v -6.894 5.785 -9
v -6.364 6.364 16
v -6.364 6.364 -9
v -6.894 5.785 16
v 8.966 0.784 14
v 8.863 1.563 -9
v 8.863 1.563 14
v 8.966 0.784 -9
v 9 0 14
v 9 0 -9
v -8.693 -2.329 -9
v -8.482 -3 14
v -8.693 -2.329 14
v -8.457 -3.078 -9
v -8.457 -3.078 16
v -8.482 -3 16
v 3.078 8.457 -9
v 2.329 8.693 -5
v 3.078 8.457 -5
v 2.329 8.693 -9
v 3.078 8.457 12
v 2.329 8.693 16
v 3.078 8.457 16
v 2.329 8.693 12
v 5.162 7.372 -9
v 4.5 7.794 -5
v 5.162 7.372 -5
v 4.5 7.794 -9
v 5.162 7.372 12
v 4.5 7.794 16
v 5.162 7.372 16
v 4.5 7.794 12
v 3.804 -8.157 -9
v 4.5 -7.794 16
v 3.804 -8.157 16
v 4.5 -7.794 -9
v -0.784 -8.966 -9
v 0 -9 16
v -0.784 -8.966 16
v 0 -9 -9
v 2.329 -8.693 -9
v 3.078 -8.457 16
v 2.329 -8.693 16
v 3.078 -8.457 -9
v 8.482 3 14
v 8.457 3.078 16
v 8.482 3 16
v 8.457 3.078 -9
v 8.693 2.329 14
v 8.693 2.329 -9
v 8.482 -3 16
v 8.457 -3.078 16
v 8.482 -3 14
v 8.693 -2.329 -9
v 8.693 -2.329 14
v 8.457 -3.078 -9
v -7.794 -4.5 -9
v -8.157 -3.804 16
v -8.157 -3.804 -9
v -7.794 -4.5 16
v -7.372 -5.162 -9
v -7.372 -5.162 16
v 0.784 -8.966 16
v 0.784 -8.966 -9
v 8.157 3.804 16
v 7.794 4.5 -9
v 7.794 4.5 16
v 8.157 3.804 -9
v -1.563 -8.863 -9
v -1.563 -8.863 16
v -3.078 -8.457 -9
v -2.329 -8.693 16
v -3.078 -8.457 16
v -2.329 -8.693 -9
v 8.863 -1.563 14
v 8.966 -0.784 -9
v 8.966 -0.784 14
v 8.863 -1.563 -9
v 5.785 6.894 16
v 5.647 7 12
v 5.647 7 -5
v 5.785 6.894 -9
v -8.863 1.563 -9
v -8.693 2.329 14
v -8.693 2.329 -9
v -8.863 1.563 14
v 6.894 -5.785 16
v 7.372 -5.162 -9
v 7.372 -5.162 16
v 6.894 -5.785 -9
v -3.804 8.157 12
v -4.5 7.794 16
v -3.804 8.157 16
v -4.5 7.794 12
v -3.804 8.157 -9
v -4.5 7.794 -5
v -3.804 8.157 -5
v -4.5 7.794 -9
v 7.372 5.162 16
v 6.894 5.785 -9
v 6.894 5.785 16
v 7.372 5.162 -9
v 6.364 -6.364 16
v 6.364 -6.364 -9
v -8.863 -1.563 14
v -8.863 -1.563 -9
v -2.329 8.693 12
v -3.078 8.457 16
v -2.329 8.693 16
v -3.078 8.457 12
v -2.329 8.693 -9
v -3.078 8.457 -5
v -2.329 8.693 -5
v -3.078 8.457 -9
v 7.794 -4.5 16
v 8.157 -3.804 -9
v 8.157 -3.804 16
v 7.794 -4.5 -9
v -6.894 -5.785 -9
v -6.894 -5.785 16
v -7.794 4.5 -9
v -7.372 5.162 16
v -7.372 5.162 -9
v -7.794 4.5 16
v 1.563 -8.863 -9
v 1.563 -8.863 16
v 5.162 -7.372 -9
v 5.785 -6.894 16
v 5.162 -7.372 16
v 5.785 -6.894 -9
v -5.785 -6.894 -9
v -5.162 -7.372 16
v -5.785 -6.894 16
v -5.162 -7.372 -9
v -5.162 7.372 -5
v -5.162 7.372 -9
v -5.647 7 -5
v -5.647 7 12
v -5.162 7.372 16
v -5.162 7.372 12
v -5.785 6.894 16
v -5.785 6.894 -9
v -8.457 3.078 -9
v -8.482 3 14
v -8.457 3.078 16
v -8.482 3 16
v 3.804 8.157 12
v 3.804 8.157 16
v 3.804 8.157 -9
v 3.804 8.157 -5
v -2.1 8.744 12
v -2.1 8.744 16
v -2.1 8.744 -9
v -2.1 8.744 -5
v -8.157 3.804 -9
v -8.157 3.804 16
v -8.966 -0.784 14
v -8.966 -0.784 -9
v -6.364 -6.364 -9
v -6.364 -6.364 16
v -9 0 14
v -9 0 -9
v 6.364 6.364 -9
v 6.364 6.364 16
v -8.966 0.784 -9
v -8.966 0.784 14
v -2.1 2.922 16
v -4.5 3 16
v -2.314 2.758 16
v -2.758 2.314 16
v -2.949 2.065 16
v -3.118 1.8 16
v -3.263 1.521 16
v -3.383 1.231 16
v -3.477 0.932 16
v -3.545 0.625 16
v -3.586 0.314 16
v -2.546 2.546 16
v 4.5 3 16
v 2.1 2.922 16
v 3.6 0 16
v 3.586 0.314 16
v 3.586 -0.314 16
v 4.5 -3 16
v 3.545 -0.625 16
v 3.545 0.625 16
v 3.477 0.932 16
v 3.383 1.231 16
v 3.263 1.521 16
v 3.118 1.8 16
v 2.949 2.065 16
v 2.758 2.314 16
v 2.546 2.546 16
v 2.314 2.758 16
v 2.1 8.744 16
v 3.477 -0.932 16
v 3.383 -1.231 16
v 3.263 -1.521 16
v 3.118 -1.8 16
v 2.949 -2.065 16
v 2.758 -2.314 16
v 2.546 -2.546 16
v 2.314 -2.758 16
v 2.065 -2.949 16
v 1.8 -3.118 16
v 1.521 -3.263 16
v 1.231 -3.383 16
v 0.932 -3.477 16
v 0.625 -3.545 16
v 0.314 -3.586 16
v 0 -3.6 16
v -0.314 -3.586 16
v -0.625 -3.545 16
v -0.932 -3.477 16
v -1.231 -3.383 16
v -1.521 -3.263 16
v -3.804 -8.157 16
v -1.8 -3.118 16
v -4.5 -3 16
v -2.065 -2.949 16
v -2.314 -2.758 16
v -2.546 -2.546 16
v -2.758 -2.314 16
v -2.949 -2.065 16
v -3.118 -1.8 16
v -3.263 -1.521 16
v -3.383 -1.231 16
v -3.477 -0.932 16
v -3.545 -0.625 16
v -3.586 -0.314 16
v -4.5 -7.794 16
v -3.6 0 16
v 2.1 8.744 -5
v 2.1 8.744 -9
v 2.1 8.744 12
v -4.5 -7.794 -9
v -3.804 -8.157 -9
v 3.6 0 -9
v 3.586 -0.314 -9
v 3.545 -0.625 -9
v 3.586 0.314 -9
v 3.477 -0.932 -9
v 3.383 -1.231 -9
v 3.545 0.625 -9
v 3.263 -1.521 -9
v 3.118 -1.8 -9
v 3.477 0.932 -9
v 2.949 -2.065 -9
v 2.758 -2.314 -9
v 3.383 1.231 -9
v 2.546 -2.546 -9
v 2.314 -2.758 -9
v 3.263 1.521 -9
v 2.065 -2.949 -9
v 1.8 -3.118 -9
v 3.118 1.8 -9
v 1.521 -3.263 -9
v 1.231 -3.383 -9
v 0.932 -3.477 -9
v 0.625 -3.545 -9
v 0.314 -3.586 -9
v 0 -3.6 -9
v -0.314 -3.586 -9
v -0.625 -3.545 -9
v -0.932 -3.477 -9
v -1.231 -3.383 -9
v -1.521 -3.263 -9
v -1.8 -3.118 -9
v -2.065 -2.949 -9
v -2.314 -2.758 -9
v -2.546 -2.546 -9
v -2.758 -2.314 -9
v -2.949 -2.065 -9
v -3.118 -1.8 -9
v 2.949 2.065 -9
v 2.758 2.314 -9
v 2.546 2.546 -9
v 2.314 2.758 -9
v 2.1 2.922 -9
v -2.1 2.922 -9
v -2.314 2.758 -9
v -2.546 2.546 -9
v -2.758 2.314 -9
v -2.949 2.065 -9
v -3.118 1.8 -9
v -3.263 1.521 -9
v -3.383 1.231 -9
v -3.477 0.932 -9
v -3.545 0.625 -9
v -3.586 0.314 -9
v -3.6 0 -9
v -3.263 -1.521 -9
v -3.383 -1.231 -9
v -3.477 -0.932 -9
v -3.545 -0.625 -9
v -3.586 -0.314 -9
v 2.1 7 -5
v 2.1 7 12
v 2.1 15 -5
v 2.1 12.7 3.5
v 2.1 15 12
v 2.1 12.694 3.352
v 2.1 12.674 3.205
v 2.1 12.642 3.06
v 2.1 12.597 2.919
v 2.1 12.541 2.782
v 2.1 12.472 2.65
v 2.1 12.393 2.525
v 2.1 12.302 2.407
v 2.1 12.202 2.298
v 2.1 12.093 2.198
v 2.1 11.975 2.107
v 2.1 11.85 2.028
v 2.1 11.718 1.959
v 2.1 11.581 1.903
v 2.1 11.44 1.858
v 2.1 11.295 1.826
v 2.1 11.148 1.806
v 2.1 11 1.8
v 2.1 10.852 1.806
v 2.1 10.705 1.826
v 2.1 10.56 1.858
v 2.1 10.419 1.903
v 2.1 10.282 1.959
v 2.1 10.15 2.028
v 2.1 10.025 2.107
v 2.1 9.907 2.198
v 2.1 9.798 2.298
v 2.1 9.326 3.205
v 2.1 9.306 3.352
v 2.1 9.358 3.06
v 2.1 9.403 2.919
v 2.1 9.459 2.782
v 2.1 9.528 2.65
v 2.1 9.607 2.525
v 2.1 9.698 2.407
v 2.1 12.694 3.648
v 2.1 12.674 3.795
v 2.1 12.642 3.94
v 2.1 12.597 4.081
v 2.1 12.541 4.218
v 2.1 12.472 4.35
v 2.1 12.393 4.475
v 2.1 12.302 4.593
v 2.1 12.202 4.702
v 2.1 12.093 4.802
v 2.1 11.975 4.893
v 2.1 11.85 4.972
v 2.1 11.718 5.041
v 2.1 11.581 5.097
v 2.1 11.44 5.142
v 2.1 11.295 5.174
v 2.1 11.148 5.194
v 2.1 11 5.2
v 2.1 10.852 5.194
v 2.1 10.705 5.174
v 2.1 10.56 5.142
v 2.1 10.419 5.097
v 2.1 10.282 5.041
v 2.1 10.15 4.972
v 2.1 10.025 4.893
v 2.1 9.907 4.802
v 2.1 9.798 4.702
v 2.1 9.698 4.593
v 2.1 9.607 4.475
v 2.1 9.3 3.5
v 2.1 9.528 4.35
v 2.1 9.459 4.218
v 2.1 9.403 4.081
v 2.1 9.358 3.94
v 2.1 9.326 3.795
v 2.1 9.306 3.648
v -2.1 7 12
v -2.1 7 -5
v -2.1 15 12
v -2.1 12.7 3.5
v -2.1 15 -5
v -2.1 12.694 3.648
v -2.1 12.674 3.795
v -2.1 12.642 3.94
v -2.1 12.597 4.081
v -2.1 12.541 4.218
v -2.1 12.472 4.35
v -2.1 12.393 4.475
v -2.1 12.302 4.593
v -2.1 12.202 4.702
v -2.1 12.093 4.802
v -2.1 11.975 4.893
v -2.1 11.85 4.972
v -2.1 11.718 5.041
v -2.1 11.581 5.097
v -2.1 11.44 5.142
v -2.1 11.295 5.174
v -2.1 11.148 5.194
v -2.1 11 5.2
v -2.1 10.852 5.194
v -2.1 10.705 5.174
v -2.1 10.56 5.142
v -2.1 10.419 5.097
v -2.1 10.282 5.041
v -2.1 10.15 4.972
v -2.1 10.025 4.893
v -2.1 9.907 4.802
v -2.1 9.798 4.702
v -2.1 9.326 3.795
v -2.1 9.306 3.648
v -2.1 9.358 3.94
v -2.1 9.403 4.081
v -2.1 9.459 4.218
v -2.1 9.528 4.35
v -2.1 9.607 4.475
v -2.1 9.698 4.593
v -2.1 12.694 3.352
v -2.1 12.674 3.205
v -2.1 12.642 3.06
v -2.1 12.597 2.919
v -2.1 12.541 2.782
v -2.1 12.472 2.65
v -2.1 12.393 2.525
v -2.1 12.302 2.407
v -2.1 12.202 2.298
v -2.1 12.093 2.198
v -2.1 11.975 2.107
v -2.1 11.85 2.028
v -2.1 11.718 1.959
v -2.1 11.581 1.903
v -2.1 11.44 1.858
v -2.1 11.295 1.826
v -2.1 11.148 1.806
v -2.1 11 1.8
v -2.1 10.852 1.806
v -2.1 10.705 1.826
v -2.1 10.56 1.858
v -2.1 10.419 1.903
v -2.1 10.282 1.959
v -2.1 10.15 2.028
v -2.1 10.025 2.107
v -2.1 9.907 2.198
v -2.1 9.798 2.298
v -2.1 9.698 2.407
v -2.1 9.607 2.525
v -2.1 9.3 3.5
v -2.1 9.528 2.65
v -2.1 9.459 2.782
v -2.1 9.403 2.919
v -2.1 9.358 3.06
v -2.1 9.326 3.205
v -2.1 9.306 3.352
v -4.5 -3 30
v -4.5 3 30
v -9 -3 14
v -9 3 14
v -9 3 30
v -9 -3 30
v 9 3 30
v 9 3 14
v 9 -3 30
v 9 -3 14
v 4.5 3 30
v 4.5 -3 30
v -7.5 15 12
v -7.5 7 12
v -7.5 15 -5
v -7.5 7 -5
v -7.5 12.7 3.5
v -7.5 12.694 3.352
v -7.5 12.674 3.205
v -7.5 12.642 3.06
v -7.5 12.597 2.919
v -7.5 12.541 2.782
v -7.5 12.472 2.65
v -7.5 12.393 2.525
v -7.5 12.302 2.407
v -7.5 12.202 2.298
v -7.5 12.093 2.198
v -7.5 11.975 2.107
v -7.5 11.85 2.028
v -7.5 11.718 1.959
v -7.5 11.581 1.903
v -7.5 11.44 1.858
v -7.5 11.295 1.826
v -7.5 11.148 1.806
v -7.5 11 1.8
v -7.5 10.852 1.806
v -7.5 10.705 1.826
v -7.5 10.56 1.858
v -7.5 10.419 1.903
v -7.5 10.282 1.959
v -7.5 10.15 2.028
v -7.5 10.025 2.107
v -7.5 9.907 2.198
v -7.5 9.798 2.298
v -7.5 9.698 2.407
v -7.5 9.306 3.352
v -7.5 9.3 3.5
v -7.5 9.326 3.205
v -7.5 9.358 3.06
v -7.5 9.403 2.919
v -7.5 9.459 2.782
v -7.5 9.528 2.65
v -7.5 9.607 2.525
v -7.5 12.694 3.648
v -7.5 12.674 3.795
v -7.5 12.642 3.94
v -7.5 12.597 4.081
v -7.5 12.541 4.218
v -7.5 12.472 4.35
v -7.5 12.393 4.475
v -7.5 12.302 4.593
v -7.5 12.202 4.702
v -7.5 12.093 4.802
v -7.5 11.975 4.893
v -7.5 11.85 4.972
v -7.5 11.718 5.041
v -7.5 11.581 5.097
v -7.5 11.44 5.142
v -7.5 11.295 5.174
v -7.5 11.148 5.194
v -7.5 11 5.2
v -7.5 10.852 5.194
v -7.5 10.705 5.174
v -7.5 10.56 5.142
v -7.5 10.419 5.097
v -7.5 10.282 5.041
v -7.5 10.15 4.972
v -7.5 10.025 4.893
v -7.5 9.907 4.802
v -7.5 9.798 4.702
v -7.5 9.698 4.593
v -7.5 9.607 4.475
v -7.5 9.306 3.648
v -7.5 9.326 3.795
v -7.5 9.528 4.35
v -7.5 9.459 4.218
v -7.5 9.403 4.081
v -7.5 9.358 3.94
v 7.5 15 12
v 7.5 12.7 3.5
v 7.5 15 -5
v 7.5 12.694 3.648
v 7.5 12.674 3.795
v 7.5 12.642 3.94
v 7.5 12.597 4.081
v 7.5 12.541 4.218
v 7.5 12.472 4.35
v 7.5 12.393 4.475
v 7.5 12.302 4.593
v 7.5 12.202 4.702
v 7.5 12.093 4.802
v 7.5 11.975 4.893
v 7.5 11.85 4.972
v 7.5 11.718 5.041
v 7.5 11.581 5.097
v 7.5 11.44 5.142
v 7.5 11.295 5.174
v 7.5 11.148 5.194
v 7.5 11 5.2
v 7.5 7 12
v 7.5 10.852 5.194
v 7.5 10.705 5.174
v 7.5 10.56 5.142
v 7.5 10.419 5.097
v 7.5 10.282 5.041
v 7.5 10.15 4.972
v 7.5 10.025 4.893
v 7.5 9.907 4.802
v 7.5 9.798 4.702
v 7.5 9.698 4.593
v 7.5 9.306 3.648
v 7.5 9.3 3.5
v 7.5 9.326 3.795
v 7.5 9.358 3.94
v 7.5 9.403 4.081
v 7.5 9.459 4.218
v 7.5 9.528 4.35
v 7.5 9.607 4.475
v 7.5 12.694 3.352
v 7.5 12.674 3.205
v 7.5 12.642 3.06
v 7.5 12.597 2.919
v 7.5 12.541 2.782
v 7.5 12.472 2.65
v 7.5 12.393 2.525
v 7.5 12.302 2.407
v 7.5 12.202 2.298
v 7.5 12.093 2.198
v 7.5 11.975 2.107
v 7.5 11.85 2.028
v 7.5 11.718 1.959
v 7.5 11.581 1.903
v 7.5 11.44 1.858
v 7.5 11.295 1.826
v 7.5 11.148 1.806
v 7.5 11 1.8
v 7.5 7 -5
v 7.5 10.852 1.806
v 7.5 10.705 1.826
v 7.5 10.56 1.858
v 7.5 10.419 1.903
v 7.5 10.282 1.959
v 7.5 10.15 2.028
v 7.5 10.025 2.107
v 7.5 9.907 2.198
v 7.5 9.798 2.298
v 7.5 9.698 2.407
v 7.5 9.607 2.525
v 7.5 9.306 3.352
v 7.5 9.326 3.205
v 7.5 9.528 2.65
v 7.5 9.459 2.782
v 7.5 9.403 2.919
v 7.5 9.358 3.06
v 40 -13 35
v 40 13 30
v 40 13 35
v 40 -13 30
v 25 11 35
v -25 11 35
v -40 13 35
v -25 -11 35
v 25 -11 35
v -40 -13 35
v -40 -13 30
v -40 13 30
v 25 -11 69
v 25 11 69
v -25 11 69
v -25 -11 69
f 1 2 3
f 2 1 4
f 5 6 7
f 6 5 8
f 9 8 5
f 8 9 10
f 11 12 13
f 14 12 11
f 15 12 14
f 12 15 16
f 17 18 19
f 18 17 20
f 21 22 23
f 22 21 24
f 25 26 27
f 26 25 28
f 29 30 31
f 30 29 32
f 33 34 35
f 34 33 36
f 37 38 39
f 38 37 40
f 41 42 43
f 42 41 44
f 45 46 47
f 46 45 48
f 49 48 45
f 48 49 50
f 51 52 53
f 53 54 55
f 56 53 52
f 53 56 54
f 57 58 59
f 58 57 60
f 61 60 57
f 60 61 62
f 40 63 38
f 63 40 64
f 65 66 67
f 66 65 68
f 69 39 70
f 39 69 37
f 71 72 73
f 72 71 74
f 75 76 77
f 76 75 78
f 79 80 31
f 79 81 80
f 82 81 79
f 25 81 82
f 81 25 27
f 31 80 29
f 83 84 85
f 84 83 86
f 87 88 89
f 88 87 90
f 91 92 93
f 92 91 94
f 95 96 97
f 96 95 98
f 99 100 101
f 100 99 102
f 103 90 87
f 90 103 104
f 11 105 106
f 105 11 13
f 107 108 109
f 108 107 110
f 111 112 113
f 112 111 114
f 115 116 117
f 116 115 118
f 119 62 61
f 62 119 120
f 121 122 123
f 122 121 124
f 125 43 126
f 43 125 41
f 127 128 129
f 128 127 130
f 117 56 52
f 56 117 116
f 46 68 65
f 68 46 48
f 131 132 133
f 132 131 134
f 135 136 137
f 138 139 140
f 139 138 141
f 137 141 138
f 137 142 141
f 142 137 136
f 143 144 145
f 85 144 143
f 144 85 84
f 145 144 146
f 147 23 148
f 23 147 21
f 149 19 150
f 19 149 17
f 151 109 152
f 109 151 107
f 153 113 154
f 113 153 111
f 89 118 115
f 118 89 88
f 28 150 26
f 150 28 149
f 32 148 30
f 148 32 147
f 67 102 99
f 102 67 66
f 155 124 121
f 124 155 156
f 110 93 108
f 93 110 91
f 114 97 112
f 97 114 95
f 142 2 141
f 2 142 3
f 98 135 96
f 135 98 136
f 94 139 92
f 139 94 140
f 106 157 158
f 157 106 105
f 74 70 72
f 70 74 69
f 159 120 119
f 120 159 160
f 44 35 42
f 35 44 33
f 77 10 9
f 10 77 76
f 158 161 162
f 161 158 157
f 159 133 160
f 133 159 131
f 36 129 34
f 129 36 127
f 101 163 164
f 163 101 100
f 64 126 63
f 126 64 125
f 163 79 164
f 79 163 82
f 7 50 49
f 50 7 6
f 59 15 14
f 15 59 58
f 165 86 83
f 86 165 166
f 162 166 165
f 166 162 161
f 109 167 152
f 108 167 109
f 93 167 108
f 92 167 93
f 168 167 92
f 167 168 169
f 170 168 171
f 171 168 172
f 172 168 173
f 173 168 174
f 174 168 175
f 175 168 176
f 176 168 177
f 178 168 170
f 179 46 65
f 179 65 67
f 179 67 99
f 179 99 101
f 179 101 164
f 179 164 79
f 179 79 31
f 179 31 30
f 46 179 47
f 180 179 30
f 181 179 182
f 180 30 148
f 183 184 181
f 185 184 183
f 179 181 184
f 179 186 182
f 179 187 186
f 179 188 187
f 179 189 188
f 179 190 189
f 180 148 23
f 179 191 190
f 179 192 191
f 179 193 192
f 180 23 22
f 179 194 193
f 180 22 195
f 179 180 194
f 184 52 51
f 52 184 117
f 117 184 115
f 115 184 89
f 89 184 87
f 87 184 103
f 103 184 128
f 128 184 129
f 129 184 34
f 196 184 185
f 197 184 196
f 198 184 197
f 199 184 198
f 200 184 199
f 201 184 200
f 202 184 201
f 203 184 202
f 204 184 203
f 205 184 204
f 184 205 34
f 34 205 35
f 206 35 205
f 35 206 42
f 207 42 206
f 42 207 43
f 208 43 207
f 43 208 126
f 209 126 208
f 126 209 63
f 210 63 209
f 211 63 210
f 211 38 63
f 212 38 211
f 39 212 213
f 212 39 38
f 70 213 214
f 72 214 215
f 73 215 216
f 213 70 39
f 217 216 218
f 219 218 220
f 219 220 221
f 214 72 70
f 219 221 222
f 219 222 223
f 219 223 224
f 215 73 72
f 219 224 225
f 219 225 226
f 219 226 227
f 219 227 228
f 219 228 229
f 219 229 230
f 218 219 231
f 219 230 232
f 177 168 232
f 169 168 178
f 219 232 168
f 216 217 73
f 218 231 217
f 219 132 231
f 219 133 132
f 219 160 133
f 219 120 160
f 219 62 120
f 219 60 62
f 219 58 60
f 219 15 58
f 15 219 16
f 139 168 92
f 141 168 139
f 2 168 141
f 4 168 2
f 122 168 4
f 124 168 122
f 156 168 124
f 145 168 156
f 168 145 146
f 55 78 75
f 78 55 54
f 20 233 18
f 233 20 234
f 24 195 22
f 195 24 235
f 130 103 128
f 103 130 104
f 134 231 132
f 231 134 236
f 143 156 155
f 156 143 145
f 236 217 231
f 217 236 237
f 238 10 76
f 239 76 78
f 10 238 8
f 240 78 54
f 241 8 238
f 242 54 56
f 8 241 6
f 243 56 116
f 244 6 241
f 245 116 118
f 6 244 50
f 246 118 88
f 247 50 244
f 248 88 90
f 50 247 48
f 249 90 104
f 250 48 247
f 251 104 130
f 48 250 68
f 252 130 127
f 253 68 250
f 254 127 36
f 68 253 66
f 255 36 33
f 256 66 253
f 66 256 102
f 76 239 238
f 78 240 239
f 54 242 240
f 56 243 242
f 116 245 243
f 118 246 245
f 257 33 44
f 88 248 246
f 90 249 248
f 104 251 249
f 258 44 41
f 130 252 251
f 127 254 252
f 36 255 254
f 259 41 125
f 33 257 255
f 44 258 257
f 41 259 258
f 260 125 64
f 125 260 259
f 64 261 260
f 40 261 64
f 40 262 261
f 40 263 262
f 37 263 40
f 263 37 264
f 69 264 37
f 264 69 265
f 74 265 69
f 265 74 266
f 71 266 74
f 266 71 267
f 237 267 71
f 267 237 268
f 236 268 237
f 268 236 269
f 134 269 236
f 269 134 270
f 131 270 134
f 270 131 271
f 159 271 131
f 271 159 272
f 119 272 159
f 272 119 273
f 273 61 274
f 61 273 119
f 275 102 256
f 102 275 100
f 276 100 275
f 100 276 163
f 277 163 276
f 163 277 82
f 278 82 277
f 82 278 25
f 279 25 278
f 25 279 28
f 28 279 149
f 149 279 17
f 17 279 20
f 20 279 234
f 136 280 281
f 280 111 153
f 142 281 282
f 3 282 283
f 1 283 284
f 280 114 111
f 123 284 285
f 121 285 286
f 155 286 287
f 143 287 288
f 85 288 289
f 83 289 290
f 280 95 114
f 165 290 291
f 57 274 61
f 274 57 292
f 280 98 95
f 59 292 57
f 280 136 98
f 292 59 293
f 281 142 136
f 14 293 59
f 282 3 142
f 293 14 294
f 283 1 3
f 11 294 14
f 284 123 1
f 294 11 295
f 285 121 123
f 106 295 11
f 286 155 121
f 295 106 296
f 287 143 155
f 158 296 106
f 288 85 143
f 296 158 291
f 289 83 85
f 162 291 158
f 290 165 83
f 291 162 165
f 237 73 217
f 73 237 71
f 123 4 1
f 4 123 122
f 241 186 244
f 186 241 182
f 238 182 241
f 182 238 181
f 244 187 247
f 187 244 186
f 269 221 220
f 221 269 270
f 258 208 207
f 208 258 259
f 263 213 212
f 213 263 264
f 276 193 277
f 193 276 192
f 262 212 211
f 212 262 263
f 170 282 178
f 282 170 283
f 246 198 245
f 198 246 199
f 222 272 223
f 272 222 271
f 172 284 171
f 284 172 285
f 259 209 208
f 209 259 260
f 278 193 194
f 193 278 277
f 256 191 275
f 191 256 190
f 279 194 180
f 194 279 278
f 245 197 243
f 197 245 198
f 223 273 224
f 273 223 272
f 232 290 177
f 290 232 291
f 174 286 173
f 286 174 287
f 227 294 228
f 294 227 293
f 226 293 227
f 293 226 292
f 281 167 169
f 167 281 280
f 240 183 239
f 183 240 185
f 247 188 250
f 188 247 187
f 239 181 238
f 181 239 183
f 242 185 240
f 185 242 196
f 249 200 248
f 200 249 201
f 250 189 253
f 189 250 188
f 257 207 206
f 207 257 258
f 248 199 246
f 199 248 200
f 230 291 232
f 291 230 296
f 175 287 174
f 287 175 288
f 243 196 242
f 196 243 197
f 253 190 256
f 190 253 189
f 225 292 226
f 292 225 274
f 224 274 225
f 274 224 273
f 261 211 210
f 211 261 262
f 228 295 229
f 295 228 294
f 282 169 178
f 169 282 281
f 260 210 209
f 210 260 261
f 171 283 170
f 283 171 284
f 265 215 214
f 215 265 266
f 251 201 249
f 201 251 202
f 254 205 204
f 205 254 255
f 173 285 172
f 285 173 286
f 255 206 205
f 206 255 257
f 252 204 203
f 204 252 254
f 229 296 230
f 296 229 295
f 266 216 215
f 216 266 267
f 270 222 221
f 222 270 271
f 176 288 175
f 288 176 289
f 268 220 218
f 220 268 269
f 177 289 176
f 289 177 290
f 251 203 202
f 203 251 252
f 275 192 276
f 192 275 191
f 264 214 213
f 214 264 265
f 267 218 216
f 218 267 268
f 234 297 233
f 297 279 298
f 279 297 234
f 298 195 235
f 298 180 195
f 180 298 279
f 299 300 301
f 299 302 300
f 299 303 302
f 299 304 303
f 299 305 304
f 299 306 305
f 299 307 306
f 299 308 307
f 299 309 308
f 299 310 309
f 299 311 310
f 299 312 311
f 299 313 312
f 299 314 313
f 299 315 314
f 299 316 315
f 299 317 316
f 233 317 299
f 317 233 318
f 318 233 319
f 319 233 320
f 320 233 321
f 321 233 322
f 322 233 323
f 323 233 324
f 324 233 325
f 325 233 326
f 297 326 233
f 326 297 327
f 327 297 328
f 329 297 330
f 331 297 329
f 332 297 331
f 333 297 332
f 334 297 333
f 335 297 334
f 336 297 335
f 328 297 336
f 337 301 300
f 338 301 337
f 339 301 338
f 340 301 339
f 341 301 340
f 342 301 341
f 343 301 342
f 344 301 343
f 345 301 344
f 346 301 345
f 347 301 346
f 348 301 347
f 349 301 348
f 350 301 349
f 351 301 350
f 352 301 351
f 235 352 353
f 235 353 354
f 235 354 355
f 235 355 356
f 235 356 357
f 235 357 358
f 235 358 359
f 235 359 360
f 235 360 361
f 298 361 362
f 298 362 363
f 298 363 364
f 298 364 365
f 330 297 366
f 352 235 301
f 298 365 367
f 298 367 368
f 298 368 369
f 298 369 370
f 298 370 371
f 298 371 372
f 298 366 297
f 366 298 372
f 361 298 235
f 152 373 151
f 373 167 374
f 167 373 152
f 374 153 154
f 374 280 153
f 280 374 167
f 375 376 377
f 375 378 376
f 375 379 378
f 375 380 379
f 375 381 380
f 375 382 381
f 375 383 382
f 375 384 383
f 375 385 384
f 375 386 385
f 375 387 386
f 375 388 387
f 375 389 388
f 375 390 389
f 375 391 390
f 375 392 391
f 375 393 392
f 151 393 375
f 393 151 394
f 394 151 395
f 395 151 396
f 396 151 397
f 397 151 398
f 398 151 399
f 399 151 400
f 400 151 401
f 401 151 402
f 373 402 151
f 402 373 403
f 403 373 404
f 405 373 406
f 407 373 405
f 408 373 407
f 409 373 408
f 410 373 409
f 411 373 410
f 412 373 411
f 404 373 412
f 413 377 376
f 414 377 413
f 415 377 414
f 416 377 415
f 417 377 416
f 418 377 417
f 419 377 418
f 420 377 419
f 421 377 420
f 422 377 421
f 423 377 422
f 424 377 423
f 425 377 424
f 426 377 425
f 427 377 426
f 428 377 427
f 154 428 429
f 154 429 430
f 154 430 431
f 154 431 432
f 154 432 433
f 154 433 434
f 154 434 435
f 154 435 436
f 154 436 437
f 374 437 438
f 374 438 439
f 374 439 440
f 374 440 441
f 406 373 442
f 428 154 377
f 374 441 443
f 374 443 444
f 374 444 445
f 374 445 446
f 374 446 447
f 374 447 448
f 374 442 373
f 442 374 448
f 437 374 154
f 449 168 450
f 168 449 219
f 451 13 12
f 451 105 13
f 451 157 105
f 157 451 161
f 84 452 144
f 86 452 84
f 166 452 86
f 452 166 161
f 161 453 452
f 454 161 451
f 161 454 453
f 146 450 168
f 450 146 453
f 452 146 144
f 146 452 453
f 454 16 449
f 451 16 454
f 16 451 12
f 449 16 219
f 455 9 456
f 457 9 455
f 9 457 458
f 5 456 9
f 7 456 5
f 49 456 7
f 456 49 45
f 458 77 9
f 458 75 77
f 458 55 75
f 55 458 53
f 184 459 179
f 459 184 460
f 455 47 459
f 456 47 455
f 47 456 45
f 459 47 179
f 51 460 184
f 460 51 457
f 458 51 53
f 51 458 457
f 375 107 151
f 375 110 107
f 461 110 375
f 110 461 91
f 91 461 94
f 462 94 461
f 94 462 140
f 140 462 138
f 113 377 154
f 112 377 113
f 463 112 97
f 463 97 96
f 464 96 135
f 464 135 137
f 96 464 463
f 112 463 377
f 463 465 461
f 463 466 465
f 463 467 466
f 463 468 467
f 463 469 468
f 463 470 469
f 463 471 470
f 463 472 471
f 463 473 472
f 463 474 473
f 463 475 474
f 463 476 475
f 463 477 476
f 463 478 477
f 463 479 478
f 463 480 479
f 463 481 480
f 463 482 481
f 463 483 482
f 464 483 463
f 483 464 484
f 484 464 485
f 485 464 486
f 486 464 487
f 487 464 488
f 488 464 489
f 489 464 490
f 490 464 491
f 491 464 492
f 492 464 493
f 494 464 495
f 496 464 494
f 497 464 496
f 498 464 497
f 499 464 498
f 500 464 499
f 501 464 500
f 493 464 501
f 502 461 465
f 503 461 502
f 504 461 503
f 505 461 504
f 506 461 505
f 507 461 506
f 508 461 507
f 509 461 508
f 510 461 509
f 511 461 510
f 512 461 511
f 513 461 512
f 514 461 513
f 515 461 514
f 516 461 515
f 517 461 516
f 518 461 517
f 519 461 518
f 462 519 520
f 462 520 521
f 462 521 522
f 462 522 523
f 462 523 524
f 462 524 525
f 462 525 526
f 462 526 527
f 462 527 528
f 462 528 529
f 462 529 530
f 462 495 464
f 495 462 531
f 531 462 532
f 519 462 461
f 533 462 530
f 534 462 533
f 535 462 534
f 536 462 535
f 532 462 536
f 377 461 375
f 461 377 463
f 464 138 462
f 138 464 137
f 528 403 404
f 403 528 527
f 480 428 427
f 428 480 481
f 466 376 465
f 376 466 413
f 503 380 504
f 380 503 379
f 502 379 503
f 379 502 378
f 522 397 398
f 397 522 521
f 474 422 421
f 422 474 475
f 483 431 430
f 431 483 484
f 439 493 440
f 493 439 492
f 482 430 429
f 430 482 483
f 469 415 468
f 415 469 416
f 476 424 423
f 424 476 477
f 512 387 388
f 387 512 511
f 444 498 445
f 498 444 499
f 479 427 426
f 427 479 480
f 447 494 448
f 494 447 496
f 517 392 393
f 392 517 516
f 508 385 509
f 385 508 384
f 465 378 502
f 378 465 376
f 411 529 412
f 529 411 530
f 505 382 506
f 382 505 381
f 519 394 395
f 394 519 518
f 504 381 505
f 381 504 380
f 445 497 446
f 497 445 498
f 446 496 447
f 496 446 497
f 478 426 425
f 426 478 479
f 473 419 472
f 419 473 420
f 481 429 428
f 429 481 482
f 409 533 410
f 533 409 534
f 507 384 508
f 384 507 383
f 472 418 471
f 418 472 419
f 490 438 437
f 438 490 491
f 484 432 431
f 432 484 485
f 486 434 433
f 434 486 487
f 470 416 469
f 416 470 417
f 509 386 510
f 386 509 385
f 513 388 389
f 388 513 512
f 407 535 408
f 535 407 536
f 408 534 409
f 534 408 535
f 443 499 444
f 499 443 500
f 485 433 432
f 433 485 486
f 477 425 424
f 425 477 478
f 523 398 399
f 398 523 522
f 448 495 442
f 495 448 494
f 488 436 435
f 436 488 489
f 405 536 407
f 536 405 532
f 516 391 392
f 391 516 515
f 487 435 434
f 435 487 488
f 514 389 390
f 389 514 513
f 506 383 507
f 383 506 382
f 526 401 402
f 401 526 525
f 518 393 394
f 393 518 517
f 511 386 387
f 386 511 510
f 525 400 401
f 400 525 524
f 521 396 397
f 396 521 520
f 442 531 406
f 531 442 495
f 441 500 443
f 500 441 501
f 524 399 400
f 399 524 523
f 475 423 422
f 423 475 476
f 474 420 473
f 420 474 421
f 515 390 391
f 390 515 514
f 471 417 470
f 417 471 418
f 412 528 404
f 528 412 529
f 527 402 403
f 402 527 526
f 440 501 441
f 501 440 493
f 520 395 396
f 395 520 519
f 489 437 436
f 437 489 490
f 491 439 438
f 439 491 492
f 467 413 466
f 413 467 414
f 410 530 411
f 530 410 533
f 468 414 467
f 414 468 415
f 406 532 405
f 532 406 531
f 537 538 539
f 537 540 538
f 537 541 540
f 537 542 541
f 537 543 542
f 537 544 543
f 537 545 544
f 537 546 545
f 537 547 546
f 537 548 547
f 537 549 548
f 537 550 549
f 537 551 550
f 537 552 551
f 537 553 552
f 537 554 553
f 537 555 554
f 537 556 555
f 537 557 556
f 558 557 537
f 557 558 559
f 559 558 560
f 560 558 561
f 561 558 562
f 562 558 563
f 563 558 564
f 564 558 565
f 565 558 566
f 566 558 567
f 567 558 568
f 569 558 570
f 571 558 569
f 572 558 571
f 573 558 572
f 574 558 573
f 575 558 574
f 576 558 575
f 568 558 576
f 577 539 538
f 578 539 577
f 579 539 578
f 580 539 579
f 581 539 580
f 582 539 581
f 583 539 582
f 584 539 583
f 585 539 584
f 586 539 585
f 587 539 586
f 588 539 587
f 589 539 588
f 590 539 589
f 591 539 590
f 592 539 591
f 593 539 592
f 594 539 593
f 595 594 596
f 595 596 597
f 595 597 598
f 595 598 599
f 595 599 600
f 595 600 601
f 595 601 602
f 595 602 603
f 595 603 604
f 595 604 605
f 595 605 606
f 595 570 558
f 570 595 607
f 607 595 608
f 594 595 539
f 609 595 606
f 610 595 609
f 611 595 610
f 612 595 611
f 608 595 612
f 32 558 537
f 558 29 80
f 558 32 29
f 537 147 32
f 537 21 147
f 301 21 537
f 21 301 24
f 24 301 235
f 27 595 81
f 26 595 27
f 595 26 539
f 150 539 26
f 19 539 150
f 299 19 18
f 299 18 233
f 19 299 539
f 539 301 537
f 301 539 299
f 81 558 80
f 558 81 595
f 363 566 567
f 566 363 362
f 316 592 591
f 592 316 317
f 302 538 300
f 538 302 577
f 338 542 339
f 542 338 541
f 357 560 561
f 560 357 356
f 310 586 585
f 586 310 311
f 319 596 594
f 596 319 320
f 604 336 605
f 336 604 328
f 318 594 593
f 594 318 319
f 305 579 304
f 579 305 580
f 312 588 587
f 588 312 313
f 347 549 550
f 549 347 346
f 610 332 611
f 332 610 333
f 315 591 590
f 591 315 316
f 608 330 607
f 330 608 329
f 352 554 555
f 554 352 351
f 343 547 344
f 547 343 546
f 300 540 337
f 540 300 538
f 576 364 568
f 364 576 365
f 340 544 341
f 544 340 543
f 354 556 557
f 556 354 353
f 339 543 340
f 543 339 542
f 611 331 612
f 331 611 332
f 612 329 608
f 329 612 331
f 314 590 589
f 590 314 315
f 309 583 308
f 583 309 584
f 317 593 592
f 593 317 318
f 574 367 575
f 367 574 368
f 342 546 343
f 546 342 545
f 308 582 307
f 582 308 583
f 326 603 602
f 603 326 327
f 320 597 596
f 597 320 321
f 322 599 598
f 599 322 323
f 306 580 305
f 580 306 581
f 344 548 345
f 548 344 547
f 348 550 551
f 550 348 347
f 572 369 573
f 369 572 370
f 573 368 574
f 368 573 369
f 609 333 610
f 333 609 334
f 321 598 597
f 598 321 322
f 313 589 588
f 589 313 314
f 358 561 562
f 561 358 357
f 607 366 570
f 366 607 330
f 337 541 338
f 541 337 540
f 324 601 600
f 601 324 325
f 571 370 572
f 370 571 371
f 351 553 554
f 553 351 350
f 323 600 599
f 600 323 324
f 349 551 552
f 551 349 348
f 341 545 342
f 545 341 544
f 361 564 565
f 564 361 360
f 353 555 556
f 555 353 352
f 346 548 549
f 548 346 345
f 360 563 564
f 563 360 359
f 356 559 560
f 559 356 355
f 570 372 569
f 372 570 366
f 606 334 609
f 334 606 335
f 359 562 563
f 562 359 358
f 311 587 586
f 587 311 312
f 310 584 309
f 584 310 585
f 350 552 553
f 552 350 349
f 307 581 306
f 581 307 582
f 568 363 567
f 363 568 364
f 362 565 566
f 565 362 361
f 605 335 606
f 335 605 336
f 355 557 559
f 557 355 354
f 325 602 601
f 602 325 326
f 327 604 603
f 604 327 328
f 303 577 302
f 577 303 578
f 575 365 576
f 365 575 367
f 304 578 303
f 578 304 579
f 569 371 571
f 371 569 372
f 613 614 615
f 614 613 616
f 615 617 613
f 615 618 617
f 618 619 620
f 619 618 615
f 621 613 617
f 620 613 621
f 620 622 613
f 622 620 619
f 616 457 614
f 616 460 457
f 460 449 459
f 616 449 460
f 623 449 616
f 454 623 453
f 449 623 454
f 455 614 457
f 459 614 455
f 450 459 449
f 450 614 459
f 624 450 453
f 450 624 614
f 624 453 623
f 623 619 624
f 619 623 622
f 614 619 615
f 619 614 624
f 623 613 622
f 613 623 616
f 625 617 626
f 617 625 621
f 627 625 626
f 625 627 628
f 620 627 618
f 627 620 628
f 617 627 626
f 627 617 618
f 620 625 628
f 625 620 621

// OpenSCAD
// Endoscope holder for the OnRobot 2FG7 on the UR5e - first fit-check version.
// The 2FG7 grips the top block; the 7 mm x 40 mm endoscope head clamps in the tube, lens down, on the tool axis.
// Printed as drawn (grip block up). Units: mm. endoscope_holder.stl is this file at these values.

grip_w     = 50;    // between the fingers - inside the 2FG7's 35-73 mm outward range
grip_d     = 22;
grip_h     = 34;
shoulder_w = 80;    // lip under the fingertips, so the block cannot slide out downward
shoulder_d = 26;
shoulder_t = 5;
pillar_gap = 9;     // the cable turns out between the two pillars
pillar_h   = 14;
tube_r     = 9;
bore_d     = 7.2;   // 7.0 mm head + 0.2 mm print clearance
tube_len   = 25;    // 25 of the head's 40 mm held, 15 mm and the lens below
slot       = 4.2;   // the cable presses in through this, then the head is pulled up into the bore
ear_x      = 7.5;
screw_d    = 3.4;   // M3 screw and nut squeeze the slot shut
$fn        = 72;

tube_top = -9 + tube_len;
plate_z  = tube_top + pillar_h;
grip_z   = plate_z + shoulder_t;

module c_tube()
    difference() {
        translate([0, 0, -9]) cylinder(r = tube_r, h = tube_len);
        translate([0, 0, -10]) cylinder(d = bore_d, h = tube_len + 2);
        translate([-slot / 2, 0, -10]) cube([slot, tube_r + 1, tube_len + 2]);
    }

module ear(x0, x1)
    difference() {
        translate([x0, 7, -5]) cube([x1 - x0, 8, 17]);
        translate([x0 - 1, 11, 3.5]) rotate([0, 90, 0]) cylinder(d = screw_d, h = x1 - x0 + 2);
    }

union() {
    c_tube();
    for (side = [-1, 1])
        translate([side > 0 ? pillar_gap / 2 : -tube_r, -3, tube_top - 2]) cube([tube_r - pillar_gap / 2, 6, pillar_h + 2.5]);
    translate([-shoulder_w / 2, -shoulder_d / 2, plate_z]) cube([shoulder_w, shoulder_d, shoulder_t]);
    translate([-grip_w / 2, -grip_d / 2, grip_z - 0.5]) cube([grip_w, grip_d, grip_h + 0.5]);
    ear(-ear_x, -slot / 2);
    ear(slot / 2, ear_x);
}
